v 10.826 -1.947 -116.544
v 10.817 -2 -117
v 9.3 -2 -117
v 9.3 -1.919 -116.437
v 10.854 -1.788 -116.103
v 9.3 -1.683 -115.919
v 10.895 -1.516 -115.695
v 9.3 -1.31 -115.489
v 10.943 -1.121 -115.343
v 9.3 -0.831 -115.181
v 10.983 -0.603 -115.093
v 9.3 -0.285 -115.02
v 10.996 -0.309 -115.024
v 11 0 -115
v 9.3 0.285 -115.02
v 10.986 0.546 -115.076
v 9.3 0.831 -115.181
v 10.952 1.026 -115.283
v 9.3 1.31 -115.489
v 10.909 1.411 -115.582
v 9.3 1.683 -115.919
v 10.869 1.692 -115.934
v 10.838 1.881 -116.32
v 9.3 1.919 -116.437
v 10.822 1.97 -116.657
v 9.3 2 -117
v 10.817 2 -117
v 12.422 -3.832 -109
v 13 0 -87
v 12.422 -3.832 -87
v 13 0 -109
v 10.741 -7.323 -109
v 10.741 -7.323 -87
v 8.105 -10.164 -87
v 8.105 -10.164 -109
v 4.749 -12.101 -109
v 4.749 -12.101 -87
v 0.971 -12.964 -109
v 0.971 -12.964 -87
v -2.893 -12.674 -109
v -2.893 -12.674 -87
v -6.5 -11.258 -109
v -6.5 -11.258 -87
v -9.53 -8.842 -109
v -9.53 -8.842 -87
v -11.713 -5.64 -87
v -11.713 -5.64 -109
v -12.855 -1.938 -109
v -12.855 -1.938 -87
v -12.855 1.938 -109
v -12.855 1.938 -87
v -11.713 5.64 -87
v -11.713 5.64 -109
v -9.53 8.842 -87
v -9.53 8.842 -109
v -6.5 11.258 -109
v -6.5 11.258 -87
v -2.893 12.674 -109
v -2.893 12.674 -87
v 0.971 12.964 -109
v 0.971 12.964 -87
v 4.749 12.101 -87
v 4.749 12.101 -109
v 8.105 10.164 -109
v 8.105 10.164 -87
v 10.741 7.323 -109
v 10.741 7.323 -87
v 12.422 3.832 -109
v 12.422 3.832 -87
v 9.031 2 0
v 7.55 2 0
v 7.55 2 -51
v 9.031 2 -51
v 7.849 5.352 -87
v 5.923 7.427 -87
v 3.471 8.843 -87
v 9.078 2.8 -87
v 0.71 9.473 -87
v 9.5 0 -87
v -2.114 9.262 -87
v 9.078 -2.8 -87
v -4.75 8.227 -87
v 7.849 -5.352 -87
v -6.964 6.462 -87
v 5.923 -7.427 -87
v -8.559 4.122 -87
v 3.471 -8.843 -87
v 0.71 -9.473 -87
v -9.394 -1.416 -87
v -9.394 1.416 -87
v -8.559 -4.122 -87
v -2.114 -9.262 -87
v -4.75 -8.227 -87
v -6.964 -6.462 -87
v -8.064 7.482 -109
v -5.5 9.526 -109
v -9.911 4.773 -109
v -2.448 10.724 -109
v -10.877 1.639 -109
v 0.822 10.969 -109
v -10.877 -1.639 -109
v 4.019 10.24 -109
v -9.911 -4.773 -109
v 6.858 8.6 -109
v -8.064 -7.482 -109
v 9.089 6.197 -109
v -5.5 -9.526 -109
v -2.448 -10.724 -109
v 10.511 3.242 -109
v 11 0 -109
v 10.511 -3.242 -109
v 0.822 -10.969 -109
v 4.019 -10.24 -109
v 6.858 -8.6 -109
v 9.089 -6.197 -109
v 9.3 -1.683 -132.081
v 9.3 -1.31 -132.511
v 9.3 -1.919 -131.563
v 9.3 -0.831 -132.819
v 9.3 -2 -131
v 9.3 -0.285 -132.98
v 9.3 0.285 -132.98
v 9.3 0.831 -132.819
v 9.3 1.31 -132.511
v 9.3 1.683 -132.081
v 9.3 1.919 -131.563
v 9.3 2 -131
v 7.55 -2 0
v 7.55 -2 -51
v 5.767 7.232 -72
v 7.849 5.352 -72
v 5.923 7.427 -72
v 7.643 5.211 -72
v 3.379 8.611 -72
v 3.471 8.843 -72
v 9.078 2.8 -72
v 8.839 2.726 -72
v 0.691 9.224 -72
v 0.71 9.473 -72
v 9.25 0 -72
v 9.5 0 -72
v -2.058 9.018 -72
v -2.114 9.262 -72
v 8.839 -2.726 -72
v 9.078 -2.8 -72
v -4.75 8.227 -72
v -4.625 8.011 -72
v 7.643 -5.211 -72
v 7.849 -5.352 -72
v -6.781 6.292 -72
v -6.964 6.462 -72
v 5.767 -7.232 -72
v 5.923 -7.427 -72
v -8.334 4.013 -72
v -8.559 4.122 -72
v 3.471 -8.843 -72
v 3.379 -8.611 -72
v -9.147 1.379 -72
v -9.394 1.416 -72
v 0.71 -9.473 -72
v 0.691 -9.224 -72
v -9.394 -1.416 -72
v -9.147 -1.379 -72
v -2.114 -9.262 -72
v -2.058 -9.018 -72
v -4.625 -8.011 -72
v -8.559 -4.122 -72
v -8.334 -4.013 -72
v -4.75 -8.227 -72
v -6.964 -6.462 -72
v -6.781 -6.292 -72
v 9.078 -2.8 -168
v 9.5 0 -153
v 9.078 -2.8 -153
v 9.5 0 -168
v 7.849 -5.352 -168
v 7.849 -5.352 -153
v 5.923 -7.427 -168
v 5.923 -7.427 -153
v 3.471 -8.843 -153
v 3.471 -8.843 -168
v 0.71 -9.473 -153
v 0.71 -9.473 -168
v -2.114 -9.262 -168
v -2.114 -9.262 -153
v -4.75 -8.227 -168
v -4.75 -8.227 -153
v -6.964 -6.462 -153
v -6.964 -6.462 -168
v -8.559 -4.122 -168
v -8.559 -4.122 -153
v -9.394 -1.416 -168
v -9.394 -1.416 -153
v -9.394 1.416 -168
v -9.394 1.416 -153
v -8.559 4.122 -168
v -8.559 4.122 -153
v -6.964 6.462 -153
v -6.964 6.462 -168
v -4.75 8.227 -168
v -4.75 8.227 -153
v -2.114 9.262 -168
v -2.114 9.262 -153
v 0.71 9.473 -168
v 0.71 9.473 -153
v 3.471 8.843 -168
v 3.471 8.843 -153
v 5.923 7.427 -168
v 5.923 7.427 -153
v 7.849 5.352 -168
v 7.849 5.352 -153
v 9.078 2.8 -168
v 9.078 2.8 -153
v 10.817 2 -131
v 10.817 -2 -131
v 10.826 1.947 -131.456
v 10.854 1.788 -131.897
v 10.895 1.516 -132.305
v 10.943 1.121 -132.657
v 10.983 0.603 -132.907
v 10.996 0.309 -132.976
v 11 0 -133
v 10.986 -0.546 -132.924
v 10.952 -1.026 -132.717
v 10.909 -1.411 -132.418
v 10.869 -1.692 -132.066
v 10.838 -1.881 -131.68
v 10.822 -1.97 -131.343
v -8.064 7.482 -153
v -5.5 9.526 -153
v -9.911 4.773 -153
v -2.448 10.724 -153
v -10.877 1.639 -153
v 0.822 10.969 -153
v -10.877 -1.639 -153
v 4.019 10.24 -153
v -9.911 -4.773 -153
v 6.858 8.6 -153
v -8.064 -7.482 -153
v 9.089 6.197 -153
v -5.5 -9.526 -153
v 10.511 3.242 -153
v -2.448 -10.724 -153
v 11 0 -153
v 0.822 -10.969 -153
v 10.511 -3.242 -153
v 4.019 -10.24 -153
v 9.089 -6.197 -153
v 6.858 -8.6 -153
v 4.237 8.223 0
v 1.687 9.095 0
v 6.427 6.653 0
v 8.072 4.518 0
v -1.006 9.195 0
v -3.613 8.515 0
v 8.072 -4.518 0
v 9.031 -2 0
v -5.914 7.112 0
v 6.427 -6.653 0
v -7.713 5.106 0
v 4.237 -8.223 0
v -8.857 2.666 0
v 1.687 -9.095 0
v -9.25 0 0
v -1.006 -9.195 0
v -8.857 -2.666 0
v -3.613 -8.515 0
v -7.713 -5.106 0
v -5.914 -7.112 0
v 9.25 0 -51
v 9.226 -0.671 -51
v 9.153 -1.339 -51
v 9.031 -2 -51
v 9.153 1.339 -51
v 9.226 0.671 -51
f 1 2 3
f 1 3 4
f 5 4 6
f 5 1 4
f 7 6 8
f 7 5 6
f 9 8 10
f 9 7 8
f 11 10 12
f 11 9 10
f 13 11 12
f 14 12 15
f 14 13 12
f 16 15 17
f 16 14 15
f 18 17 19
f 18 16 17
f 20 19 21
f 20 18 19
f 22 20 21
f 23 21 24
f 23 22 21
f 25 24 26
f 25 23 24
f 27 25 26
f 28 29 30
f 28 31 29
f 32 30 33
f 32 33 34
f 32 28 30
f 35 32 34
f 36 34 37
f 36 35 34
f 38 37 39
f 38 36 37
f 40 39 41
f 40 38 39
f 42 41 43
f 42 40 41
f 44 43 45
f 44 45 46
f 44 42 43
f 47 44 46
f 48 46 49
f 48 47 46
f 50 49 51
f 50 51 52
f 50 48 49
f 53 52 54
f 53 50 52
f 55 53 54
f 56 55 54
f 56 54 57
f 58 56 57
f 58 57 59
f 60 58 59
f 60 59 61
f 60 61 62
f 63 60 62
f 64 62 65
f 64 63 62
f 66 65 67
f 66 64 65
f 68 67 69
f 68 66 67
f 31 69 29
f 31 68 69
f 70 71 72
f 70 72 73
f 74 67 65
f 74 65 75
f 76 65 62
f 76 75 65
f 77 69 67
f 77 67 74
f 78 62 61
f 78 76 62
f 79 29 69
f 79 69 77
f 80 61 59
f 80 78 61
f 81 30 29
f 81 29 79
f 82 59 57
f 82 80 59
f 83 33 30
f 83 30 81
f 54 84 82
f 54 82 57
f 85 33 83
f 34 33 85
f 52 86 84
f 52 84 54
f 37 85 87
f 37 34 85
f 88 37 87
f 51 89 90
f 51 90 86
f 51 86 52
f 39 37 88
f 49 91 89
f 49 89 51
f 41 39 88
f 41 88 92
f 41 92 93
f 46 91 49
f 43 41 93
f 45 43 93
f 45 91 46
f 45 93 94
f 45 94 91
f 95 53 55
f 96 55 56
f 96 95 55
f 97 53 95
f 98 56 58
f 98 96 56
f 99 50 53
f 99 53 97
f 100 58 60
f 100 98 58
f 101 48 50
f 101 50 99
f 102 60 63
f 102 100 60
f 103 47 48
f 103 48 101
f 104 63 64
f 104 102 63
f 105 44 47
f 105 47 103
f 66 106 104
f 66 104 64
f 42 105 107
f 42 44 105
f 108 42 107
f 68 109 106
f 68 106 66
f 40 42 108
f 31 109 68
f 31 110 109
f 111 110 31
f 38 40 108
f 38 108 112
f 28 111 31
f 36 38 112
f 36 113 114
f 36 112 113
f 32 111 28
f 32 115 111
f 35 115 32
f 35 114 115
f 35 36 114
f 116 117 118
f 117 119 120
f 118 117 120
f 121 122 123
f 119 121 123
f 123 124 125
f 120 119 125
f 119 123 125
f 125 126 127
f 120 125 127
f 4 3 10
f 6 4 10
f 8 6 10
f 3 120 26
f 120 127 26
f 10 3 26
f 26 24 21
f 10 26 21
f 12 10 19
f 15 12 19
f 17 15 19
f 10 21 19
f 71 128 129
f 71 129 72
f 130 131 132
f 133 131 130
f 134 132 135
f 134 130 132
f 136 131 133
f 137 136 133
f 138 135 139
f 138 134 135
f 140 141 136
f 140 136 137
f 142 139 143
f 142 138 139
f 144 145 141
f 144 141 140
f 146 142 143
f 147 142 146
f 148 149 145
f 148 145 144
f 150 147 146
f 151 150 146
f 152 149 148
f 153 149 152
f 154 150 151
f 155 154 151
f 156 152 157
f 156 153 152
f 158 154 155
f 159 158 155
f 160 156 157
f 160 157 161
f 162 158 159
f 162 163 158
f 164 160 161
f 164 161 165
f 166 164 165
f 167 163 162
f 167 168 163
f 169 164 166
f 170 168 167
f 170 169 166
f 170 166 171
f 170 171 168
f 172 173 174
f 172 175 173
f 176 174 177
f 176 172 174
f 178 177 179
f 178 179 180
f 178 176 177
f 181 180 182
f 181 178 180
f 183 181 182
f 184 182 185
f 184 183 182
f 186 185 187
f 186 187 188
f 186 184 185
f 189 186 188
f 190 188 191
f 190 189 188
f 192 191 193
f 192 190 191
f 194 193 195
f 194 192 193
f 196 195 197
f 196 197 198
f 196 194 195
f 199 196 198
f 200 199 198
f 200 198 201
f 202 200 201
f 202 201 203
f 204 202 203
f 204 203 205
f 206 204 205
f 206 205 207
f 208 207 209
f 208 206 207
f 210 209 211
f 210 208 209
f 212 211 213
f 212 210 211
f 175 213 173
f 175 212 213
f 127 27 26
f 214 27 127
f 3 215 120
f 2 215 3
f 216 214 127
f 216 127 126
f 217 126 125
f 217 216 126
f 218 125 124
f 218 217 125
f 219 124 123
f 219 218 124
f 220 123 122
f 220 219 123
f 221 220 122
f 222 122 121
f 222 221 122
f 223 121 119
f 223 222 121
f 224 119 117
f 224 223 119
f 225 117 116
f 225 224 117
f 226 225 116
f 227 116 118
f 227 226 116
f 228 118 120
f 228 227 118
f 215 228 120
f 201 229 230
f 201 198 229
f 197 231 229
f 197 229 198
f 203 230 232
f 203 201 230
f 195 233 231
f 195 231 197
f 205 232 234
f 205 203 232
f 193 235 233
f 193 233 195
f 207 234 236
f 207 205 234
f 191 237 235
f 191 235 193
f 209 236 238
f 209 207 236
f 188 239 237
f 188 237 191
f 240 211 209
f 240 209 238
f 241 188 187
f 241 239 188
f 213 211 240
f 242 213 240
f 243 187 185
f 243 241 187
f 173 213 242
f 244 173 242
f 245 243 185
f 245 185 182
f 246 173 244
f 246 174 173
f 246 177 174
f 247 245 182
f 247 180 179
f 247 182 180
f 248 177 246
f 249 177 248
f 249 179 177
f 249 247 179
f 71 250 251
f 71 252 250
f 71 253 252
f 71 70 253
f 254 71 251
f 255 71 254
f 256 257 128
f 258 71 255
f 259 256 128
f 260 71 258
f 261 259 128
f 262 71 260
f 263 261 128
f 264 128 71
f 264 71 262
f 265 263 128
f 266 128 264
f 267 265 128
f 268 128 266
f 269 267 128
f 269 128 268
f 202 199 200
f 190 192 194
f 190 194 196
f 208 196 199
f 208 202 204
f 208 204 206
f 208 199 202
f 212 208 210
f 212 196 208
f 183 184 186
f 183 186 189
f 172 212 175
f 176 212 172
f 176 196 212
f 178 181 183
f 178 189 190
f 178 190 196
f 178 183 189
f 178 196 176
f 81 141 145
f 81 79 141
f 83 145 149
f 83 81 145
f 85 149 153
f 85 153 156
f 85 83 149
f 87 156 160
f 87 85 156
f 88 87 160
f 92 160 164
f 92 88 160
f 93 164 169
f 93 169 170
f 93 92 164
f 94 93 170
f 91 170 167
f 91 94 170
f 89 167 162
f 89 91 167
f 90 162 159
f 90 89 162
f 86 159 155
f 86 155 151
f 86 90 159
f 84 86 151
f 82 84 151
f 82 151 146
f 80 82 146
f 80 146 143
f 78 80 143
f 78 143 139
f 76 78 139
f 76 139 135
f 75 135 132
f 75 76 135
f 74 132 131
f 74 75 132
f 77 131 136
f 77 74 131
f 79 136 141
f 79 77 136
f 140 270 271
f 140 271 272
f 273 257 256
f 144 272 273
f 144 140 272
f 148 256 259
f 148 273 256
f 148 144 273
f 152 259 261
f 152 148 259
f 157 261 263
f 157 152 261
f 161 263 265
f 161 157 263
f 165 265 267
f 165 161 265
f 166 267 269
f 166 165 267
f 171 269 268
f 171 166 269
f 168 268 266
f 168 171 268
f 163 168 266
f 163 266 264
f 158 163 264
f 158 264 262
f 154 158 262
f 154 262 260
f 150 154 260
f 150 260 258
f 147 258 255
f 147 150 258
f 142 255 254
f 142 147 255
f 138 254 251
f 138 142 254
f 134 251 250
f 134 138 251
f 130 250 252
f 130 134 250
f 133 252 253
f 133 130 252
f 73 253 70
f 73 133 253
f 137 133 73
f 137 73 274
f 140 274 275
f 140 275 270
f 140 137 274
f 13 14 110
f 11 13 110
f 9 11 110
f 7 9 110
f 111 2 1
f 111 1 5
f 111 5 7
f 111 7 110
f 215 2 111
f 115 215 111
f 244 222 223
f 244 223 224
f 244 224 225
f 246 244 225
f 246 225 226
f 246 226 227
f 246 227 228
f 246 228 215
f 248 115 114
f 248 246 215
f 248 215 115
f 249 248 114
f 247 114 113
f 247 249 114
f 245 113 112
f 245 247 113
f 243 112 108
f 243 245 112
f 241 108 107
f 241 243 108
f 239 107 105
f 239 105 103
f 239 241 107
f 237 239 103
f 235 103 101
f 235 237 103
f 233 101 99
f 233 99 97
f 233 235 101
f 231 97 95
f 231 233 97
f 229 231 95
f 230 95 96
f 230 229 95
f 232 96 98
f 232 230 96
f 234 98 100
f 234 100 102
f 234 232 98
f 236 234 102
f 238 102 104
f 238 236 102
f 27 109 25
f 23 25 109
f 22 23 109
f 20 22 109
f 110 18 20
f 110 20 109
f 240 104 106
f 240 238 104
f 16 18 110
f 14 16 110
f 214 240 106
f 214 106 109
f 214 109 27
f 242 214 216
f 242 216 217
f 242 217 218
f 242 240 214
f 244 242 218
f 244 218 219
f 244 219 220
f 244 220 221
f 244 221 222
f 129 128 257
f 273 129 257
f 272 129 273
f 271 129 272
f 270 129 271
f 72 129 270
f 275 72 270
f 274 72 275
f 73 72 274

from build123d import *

# Parameters (mm, degrees)
SKETCH3_W          = 4.079746654
SKETCH3_H          = 4
CUT_EXTRUDE1_DEPTH = 51
CUT_EXTRUDE2_START = 11
CUT_EXTRUDE2_DEPTH = 1.7


with BuildPart() as part:
    # Sketch2 → Revolve1 (revolve)
    with BuildSketch(Plane(origin=(0, 0, 0), x_dir=(1, 0, 0), z_dir=(0, 1, 0)), mode=Mode.PRIVATE) as revolve1_sk:
        Polygon((0, 0), (-9.25, 0), (-9.25, 72), (-9.5, 72), (-9.5, 87), (-13, 87), (-13, 109), (-11, 109), (-11, 153), (-9.5, 153), (-9.5, 168), (0, 168), align=None)
    revolve(revolve1_sk.sketch.rotate(Axis((0, 0, 0), (0, 0, -1)), 180), axis=Axis((0, 0, 0), (0, 0, -1)))

    # Sketch3 → Cut-Extrude1 (cut)
    with BuildSketch(Plane.XY):
        with Locations((9.589873327, 0)):
            Rectangle(SKETCH3_W, SKETCH3_H)
    extrude(amount=-CUT_EXTRUDE1_DEPTH, mode=Mode.SUBTRACT)

    # Sketch4 → Cut-Extrude2 (cut)
    with BuildSketch(Plane(origin=(0, 0, 0), x_dir=(0, 0, -1), z_dir=(1, 0, 0)).offset(CUT_EXTRUDE2_START)):
        with BuildLine():
            Line((117, 2), (131, 2))
            ThreePointArc((131, 2), (133, 0), (131, -2))
            Line((131, -2), (117, -2))
            ThreePointArc((117, -2), (115, 0), (117, 2))
        make_face()
    extrude(amount=-CUT_EXTRUDE2_DEPTH, mode=Mode.SUBTRACT)


solid = part.part
